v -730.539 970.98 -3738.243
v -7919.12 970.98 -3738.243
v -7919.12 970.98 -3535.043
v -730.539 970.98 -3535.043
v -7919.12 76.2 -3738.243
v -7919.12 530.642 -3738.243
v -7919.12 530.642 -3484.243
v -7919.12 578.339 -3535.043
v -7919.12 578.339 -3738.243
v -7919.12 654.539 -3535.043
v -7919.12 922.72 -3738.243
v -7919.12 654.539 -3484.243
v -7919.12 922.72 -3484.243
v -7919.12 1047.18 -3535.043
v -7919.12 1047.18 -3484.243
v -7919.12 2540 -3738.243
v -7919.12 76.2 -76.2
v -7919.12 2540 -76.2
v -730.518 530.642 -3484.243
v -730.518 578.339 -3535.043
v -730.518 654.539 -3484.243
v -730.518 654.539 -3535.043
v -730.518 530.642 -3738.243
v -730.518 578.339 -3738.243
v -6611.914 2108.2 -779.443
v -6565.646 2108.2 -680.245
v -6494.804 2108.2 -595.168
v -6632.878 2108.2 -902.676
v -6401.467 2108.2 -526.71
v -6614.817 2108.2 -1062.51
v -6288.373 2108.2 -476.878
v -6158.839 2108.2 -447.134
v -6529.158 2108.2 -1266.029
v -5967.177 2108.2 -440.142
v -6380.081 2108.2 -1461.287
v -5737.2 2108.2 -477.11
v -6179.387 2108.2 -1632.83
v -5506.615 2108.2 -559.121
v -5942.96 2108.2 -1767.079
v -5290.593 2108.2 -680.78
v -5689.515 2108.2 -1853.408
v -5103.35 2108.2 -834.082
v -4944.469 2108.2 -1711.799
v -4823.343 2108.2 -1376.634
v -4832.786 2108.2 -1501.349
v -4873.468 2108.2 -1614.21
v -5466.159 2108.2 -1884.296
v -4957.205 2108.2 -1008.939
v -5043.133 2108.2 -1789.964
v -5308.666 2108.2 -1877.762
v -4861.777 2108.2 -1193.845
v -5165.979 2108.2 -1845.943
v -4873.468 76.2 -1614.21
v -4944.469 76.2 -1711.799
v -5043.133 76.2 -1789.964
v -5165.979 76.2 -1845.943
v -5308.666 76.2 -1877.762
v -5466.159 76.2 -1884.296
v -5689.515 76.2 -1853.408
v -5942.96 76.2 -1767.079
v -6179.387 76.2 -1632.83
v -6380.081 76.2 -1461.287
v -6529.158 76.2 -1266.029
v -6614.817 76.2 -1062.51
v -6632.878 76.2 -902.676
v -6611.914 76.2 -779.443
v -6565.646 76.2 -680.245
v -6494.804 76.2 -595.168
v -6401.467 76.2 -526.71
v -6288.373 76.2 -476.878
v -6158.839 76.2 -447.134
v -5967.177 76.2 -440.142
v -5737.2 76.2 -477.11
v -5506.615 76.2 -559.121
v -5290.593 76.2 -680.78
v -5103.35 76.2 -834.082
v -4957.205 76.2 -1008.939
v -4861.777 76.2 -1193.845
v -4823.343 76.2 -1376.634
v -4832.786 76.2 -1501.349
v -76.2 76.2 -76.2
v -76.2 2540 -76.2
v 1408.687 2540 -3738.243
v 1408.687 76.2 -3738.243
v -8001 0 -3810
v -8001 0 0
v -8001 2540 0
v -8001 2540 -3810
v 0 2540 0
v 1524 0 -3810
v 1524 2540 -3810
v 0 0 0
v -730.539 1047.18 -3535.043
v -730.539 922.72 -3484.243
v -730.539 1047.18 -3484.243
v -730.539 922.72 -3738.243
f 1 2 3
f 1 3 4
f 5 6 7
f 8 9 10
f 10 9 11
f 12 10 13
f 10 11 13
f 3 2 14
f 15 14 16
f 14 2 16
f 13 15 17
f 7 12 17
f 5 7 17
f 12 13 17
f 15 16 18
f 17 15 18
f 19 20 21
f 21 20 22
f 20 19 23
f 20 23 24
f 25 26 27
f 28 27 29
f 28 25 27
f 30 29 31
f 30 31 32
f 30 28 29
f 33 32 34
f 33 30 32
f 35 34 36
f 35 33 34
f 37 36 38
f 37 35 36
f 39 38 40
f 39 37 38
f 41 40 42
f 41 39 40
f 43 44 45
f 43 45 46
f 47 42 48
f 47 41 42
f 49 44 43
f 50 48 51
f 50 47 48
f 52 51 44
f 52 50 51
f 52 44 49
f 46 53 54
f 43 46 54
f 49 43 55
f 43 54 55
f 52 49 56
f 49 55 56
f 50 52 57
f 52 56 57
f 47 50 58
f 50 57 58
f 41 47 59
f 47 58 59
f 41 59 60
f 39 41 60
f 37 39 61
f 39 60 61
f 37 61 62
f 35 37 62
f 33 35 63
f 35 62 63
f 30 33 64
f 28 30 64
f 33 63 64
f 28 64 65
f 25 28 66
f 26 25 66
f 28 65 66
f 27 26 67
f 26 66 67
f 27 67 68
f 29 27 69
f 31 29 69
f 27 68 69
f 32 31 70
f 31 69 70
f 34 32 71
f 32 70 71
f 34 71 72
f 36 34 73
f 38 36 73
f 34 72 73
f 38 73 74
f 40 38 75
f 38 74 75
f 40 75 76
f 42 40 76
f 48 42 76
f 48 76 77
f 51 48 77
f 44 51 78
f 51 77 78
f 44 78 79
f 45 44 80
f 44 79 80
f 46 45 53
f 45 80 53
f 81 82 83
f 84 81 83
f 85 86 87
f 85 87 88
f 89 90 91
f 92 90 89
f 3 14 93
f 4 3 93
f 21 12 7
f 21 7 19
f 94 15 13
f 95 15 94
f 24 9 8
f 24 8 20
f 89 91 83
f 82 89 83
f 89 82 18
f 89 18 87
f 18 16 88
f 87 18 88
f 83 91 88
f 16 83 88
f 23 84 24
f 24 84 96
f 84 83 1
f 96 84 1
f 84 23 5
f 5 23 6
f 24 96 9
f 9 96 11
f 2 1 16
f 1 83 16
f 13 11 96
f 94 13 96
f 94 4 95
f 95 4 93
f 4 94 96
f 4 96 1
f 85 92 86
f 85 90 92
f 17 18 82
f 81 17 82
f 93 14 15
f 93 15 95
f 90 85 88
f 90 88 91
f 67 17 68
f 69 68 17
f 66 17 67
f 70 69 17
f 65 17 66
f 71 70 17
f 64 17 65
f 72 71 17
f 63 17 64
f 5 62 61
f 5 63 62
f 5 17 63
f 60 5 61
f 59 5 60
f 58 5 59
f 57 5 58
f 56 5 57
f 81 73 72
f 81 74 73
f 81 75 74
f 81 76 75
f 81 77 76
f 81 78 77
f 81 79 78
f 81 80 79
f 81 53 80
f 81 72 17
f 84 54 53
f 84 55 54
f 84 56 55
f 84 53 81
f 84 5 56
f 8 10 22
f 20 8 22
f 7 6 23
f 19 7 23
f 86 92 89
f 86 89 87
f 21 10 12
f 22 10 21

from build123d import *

# Parameters (mm, degrees)
BOSS_EXTRUDE1_DEPTH = 2540
CUT_EXTRUDE1_DEPTH  = 2463.8
SKETCH4_W           = 7188.60189706
SKETCH4_H           = 123.896573516
BOSS_EXTRUDE2_DEPTH = 254
SKETCH5_W           = 7188.581
SKETCH5_H           = 124.46
BOSS_EXTRUDE3_DEPTH = 254
SKETCH6_W           = 7188.581
SKETCH6_H           = 203.2
CUT_EXTRUDE2_DEPTH  = 76.2
SKETCH11_W          = 7188.60189706
SKETCH11_H          = 203.2
CUT_EXTRUDE3_DEPTH  = 76.2
SKETCH18_RX         = 966.922200264
SKETCH18_RY         = 638.624638674
BOSS_EXTRUDE4_DEPTH = 2032


with BuildPart() as part:
    # Sketch2 → Boss-Extrude1 (new body)
    with BuildSketch(Plane(origin=(0, 0, 0), x_dir=(1, 0, 0), z_dir=(0, 1, 0))):
        Polygon((0, 0), (-8001, 0), (-8001, 3810), (1524, 3810), align=None)
    extrude(amount=BOSS_EXTRUDE1_DEPTH)

    # Sketch3 → Cut-Extrude1 (cut)
    with BuildSketch(Plane(origin=(0, 2540, 0), x_dir=(1, 0, 0), z_dir=(0, 1, 0))):
        Polygon((-76.2, 76.2), (1408.686941169, 3738.242810126), (-7919.119940746, 3738.242810126), (-7919.119940746, 76.2), align=None)
    extrude(amount=-CUT_EXTRUDE1_DEPTH, mode=Mode.SUBTRACT)

    # Sketch4 → Boss-Extrude2 (add)
    with BuildSketch(Plane.XY.offset(-3738.242810126)):
        with Locations((-4324.818992216, 592.590354758)):
            Rectangle(SKETCH4_W, SKETCH4_H)
    extrude(amount=BOSS_EXTRUDE2_DEPTH)

    # Sketch5 → Boss-Extrude3 (add)
    with BuildSketch(Plane.XY.offset(-3738.242810126)):
        with Locations((-4324.829440746, 984.950312929)):
            Rectangle(SKETCH5_W, SKETCH5_H)
    extrude(amount=BOSS_EXTRUDE3_DEPTH)

    # Sketch6 → Cut-Extrude2 (cut)
    with BuildSketch(Plane(origin=(0, 1047.180312929, 0), x_dir=(1, 0, 0), z_dir=(0, 1, 0))):
        with Locations((-4324.829440746, 3636.642810126)):
            Rectangle(SKETCH6_W, SKETCH6_H)
    extrude(amount=-CUT_EXTRUDE2_DEPTH, mode=Mode.SUBTRACT)

    # Sketch11 → Cut-Extrude3 (cut)
    with BuildSketch(Plane(origin=(0, 654.538641516, 0), x_dir=(1, 0, 0), z_dir=(0, 1, 0))):
        with Locations((-4324.818992216, 3636.642810126)):
            Rectangle(SKETCH11_W, SKETCH11_H)
    extrude(amount=-CUT_EXTRUDE3_DEPTH, mode=Mode.SUBTRACT)

    # Sketch18 → Boss-Extrude4 (add)
    with BuildSketch(Plane(origin=(0, 76.2, 0), x_dir=(1, 0, 0), z_dir=(0, 1, 0))):
        with Locations(Location((-5727.951271989, 1161.666204476), (0, 0, 27.906193222))):
            Ellipse(SKETCH18_RX, SKETCH18_RY)
    extrude(amount=BOSS_EXTRUDE4_DEPTH)


solid = part.part
